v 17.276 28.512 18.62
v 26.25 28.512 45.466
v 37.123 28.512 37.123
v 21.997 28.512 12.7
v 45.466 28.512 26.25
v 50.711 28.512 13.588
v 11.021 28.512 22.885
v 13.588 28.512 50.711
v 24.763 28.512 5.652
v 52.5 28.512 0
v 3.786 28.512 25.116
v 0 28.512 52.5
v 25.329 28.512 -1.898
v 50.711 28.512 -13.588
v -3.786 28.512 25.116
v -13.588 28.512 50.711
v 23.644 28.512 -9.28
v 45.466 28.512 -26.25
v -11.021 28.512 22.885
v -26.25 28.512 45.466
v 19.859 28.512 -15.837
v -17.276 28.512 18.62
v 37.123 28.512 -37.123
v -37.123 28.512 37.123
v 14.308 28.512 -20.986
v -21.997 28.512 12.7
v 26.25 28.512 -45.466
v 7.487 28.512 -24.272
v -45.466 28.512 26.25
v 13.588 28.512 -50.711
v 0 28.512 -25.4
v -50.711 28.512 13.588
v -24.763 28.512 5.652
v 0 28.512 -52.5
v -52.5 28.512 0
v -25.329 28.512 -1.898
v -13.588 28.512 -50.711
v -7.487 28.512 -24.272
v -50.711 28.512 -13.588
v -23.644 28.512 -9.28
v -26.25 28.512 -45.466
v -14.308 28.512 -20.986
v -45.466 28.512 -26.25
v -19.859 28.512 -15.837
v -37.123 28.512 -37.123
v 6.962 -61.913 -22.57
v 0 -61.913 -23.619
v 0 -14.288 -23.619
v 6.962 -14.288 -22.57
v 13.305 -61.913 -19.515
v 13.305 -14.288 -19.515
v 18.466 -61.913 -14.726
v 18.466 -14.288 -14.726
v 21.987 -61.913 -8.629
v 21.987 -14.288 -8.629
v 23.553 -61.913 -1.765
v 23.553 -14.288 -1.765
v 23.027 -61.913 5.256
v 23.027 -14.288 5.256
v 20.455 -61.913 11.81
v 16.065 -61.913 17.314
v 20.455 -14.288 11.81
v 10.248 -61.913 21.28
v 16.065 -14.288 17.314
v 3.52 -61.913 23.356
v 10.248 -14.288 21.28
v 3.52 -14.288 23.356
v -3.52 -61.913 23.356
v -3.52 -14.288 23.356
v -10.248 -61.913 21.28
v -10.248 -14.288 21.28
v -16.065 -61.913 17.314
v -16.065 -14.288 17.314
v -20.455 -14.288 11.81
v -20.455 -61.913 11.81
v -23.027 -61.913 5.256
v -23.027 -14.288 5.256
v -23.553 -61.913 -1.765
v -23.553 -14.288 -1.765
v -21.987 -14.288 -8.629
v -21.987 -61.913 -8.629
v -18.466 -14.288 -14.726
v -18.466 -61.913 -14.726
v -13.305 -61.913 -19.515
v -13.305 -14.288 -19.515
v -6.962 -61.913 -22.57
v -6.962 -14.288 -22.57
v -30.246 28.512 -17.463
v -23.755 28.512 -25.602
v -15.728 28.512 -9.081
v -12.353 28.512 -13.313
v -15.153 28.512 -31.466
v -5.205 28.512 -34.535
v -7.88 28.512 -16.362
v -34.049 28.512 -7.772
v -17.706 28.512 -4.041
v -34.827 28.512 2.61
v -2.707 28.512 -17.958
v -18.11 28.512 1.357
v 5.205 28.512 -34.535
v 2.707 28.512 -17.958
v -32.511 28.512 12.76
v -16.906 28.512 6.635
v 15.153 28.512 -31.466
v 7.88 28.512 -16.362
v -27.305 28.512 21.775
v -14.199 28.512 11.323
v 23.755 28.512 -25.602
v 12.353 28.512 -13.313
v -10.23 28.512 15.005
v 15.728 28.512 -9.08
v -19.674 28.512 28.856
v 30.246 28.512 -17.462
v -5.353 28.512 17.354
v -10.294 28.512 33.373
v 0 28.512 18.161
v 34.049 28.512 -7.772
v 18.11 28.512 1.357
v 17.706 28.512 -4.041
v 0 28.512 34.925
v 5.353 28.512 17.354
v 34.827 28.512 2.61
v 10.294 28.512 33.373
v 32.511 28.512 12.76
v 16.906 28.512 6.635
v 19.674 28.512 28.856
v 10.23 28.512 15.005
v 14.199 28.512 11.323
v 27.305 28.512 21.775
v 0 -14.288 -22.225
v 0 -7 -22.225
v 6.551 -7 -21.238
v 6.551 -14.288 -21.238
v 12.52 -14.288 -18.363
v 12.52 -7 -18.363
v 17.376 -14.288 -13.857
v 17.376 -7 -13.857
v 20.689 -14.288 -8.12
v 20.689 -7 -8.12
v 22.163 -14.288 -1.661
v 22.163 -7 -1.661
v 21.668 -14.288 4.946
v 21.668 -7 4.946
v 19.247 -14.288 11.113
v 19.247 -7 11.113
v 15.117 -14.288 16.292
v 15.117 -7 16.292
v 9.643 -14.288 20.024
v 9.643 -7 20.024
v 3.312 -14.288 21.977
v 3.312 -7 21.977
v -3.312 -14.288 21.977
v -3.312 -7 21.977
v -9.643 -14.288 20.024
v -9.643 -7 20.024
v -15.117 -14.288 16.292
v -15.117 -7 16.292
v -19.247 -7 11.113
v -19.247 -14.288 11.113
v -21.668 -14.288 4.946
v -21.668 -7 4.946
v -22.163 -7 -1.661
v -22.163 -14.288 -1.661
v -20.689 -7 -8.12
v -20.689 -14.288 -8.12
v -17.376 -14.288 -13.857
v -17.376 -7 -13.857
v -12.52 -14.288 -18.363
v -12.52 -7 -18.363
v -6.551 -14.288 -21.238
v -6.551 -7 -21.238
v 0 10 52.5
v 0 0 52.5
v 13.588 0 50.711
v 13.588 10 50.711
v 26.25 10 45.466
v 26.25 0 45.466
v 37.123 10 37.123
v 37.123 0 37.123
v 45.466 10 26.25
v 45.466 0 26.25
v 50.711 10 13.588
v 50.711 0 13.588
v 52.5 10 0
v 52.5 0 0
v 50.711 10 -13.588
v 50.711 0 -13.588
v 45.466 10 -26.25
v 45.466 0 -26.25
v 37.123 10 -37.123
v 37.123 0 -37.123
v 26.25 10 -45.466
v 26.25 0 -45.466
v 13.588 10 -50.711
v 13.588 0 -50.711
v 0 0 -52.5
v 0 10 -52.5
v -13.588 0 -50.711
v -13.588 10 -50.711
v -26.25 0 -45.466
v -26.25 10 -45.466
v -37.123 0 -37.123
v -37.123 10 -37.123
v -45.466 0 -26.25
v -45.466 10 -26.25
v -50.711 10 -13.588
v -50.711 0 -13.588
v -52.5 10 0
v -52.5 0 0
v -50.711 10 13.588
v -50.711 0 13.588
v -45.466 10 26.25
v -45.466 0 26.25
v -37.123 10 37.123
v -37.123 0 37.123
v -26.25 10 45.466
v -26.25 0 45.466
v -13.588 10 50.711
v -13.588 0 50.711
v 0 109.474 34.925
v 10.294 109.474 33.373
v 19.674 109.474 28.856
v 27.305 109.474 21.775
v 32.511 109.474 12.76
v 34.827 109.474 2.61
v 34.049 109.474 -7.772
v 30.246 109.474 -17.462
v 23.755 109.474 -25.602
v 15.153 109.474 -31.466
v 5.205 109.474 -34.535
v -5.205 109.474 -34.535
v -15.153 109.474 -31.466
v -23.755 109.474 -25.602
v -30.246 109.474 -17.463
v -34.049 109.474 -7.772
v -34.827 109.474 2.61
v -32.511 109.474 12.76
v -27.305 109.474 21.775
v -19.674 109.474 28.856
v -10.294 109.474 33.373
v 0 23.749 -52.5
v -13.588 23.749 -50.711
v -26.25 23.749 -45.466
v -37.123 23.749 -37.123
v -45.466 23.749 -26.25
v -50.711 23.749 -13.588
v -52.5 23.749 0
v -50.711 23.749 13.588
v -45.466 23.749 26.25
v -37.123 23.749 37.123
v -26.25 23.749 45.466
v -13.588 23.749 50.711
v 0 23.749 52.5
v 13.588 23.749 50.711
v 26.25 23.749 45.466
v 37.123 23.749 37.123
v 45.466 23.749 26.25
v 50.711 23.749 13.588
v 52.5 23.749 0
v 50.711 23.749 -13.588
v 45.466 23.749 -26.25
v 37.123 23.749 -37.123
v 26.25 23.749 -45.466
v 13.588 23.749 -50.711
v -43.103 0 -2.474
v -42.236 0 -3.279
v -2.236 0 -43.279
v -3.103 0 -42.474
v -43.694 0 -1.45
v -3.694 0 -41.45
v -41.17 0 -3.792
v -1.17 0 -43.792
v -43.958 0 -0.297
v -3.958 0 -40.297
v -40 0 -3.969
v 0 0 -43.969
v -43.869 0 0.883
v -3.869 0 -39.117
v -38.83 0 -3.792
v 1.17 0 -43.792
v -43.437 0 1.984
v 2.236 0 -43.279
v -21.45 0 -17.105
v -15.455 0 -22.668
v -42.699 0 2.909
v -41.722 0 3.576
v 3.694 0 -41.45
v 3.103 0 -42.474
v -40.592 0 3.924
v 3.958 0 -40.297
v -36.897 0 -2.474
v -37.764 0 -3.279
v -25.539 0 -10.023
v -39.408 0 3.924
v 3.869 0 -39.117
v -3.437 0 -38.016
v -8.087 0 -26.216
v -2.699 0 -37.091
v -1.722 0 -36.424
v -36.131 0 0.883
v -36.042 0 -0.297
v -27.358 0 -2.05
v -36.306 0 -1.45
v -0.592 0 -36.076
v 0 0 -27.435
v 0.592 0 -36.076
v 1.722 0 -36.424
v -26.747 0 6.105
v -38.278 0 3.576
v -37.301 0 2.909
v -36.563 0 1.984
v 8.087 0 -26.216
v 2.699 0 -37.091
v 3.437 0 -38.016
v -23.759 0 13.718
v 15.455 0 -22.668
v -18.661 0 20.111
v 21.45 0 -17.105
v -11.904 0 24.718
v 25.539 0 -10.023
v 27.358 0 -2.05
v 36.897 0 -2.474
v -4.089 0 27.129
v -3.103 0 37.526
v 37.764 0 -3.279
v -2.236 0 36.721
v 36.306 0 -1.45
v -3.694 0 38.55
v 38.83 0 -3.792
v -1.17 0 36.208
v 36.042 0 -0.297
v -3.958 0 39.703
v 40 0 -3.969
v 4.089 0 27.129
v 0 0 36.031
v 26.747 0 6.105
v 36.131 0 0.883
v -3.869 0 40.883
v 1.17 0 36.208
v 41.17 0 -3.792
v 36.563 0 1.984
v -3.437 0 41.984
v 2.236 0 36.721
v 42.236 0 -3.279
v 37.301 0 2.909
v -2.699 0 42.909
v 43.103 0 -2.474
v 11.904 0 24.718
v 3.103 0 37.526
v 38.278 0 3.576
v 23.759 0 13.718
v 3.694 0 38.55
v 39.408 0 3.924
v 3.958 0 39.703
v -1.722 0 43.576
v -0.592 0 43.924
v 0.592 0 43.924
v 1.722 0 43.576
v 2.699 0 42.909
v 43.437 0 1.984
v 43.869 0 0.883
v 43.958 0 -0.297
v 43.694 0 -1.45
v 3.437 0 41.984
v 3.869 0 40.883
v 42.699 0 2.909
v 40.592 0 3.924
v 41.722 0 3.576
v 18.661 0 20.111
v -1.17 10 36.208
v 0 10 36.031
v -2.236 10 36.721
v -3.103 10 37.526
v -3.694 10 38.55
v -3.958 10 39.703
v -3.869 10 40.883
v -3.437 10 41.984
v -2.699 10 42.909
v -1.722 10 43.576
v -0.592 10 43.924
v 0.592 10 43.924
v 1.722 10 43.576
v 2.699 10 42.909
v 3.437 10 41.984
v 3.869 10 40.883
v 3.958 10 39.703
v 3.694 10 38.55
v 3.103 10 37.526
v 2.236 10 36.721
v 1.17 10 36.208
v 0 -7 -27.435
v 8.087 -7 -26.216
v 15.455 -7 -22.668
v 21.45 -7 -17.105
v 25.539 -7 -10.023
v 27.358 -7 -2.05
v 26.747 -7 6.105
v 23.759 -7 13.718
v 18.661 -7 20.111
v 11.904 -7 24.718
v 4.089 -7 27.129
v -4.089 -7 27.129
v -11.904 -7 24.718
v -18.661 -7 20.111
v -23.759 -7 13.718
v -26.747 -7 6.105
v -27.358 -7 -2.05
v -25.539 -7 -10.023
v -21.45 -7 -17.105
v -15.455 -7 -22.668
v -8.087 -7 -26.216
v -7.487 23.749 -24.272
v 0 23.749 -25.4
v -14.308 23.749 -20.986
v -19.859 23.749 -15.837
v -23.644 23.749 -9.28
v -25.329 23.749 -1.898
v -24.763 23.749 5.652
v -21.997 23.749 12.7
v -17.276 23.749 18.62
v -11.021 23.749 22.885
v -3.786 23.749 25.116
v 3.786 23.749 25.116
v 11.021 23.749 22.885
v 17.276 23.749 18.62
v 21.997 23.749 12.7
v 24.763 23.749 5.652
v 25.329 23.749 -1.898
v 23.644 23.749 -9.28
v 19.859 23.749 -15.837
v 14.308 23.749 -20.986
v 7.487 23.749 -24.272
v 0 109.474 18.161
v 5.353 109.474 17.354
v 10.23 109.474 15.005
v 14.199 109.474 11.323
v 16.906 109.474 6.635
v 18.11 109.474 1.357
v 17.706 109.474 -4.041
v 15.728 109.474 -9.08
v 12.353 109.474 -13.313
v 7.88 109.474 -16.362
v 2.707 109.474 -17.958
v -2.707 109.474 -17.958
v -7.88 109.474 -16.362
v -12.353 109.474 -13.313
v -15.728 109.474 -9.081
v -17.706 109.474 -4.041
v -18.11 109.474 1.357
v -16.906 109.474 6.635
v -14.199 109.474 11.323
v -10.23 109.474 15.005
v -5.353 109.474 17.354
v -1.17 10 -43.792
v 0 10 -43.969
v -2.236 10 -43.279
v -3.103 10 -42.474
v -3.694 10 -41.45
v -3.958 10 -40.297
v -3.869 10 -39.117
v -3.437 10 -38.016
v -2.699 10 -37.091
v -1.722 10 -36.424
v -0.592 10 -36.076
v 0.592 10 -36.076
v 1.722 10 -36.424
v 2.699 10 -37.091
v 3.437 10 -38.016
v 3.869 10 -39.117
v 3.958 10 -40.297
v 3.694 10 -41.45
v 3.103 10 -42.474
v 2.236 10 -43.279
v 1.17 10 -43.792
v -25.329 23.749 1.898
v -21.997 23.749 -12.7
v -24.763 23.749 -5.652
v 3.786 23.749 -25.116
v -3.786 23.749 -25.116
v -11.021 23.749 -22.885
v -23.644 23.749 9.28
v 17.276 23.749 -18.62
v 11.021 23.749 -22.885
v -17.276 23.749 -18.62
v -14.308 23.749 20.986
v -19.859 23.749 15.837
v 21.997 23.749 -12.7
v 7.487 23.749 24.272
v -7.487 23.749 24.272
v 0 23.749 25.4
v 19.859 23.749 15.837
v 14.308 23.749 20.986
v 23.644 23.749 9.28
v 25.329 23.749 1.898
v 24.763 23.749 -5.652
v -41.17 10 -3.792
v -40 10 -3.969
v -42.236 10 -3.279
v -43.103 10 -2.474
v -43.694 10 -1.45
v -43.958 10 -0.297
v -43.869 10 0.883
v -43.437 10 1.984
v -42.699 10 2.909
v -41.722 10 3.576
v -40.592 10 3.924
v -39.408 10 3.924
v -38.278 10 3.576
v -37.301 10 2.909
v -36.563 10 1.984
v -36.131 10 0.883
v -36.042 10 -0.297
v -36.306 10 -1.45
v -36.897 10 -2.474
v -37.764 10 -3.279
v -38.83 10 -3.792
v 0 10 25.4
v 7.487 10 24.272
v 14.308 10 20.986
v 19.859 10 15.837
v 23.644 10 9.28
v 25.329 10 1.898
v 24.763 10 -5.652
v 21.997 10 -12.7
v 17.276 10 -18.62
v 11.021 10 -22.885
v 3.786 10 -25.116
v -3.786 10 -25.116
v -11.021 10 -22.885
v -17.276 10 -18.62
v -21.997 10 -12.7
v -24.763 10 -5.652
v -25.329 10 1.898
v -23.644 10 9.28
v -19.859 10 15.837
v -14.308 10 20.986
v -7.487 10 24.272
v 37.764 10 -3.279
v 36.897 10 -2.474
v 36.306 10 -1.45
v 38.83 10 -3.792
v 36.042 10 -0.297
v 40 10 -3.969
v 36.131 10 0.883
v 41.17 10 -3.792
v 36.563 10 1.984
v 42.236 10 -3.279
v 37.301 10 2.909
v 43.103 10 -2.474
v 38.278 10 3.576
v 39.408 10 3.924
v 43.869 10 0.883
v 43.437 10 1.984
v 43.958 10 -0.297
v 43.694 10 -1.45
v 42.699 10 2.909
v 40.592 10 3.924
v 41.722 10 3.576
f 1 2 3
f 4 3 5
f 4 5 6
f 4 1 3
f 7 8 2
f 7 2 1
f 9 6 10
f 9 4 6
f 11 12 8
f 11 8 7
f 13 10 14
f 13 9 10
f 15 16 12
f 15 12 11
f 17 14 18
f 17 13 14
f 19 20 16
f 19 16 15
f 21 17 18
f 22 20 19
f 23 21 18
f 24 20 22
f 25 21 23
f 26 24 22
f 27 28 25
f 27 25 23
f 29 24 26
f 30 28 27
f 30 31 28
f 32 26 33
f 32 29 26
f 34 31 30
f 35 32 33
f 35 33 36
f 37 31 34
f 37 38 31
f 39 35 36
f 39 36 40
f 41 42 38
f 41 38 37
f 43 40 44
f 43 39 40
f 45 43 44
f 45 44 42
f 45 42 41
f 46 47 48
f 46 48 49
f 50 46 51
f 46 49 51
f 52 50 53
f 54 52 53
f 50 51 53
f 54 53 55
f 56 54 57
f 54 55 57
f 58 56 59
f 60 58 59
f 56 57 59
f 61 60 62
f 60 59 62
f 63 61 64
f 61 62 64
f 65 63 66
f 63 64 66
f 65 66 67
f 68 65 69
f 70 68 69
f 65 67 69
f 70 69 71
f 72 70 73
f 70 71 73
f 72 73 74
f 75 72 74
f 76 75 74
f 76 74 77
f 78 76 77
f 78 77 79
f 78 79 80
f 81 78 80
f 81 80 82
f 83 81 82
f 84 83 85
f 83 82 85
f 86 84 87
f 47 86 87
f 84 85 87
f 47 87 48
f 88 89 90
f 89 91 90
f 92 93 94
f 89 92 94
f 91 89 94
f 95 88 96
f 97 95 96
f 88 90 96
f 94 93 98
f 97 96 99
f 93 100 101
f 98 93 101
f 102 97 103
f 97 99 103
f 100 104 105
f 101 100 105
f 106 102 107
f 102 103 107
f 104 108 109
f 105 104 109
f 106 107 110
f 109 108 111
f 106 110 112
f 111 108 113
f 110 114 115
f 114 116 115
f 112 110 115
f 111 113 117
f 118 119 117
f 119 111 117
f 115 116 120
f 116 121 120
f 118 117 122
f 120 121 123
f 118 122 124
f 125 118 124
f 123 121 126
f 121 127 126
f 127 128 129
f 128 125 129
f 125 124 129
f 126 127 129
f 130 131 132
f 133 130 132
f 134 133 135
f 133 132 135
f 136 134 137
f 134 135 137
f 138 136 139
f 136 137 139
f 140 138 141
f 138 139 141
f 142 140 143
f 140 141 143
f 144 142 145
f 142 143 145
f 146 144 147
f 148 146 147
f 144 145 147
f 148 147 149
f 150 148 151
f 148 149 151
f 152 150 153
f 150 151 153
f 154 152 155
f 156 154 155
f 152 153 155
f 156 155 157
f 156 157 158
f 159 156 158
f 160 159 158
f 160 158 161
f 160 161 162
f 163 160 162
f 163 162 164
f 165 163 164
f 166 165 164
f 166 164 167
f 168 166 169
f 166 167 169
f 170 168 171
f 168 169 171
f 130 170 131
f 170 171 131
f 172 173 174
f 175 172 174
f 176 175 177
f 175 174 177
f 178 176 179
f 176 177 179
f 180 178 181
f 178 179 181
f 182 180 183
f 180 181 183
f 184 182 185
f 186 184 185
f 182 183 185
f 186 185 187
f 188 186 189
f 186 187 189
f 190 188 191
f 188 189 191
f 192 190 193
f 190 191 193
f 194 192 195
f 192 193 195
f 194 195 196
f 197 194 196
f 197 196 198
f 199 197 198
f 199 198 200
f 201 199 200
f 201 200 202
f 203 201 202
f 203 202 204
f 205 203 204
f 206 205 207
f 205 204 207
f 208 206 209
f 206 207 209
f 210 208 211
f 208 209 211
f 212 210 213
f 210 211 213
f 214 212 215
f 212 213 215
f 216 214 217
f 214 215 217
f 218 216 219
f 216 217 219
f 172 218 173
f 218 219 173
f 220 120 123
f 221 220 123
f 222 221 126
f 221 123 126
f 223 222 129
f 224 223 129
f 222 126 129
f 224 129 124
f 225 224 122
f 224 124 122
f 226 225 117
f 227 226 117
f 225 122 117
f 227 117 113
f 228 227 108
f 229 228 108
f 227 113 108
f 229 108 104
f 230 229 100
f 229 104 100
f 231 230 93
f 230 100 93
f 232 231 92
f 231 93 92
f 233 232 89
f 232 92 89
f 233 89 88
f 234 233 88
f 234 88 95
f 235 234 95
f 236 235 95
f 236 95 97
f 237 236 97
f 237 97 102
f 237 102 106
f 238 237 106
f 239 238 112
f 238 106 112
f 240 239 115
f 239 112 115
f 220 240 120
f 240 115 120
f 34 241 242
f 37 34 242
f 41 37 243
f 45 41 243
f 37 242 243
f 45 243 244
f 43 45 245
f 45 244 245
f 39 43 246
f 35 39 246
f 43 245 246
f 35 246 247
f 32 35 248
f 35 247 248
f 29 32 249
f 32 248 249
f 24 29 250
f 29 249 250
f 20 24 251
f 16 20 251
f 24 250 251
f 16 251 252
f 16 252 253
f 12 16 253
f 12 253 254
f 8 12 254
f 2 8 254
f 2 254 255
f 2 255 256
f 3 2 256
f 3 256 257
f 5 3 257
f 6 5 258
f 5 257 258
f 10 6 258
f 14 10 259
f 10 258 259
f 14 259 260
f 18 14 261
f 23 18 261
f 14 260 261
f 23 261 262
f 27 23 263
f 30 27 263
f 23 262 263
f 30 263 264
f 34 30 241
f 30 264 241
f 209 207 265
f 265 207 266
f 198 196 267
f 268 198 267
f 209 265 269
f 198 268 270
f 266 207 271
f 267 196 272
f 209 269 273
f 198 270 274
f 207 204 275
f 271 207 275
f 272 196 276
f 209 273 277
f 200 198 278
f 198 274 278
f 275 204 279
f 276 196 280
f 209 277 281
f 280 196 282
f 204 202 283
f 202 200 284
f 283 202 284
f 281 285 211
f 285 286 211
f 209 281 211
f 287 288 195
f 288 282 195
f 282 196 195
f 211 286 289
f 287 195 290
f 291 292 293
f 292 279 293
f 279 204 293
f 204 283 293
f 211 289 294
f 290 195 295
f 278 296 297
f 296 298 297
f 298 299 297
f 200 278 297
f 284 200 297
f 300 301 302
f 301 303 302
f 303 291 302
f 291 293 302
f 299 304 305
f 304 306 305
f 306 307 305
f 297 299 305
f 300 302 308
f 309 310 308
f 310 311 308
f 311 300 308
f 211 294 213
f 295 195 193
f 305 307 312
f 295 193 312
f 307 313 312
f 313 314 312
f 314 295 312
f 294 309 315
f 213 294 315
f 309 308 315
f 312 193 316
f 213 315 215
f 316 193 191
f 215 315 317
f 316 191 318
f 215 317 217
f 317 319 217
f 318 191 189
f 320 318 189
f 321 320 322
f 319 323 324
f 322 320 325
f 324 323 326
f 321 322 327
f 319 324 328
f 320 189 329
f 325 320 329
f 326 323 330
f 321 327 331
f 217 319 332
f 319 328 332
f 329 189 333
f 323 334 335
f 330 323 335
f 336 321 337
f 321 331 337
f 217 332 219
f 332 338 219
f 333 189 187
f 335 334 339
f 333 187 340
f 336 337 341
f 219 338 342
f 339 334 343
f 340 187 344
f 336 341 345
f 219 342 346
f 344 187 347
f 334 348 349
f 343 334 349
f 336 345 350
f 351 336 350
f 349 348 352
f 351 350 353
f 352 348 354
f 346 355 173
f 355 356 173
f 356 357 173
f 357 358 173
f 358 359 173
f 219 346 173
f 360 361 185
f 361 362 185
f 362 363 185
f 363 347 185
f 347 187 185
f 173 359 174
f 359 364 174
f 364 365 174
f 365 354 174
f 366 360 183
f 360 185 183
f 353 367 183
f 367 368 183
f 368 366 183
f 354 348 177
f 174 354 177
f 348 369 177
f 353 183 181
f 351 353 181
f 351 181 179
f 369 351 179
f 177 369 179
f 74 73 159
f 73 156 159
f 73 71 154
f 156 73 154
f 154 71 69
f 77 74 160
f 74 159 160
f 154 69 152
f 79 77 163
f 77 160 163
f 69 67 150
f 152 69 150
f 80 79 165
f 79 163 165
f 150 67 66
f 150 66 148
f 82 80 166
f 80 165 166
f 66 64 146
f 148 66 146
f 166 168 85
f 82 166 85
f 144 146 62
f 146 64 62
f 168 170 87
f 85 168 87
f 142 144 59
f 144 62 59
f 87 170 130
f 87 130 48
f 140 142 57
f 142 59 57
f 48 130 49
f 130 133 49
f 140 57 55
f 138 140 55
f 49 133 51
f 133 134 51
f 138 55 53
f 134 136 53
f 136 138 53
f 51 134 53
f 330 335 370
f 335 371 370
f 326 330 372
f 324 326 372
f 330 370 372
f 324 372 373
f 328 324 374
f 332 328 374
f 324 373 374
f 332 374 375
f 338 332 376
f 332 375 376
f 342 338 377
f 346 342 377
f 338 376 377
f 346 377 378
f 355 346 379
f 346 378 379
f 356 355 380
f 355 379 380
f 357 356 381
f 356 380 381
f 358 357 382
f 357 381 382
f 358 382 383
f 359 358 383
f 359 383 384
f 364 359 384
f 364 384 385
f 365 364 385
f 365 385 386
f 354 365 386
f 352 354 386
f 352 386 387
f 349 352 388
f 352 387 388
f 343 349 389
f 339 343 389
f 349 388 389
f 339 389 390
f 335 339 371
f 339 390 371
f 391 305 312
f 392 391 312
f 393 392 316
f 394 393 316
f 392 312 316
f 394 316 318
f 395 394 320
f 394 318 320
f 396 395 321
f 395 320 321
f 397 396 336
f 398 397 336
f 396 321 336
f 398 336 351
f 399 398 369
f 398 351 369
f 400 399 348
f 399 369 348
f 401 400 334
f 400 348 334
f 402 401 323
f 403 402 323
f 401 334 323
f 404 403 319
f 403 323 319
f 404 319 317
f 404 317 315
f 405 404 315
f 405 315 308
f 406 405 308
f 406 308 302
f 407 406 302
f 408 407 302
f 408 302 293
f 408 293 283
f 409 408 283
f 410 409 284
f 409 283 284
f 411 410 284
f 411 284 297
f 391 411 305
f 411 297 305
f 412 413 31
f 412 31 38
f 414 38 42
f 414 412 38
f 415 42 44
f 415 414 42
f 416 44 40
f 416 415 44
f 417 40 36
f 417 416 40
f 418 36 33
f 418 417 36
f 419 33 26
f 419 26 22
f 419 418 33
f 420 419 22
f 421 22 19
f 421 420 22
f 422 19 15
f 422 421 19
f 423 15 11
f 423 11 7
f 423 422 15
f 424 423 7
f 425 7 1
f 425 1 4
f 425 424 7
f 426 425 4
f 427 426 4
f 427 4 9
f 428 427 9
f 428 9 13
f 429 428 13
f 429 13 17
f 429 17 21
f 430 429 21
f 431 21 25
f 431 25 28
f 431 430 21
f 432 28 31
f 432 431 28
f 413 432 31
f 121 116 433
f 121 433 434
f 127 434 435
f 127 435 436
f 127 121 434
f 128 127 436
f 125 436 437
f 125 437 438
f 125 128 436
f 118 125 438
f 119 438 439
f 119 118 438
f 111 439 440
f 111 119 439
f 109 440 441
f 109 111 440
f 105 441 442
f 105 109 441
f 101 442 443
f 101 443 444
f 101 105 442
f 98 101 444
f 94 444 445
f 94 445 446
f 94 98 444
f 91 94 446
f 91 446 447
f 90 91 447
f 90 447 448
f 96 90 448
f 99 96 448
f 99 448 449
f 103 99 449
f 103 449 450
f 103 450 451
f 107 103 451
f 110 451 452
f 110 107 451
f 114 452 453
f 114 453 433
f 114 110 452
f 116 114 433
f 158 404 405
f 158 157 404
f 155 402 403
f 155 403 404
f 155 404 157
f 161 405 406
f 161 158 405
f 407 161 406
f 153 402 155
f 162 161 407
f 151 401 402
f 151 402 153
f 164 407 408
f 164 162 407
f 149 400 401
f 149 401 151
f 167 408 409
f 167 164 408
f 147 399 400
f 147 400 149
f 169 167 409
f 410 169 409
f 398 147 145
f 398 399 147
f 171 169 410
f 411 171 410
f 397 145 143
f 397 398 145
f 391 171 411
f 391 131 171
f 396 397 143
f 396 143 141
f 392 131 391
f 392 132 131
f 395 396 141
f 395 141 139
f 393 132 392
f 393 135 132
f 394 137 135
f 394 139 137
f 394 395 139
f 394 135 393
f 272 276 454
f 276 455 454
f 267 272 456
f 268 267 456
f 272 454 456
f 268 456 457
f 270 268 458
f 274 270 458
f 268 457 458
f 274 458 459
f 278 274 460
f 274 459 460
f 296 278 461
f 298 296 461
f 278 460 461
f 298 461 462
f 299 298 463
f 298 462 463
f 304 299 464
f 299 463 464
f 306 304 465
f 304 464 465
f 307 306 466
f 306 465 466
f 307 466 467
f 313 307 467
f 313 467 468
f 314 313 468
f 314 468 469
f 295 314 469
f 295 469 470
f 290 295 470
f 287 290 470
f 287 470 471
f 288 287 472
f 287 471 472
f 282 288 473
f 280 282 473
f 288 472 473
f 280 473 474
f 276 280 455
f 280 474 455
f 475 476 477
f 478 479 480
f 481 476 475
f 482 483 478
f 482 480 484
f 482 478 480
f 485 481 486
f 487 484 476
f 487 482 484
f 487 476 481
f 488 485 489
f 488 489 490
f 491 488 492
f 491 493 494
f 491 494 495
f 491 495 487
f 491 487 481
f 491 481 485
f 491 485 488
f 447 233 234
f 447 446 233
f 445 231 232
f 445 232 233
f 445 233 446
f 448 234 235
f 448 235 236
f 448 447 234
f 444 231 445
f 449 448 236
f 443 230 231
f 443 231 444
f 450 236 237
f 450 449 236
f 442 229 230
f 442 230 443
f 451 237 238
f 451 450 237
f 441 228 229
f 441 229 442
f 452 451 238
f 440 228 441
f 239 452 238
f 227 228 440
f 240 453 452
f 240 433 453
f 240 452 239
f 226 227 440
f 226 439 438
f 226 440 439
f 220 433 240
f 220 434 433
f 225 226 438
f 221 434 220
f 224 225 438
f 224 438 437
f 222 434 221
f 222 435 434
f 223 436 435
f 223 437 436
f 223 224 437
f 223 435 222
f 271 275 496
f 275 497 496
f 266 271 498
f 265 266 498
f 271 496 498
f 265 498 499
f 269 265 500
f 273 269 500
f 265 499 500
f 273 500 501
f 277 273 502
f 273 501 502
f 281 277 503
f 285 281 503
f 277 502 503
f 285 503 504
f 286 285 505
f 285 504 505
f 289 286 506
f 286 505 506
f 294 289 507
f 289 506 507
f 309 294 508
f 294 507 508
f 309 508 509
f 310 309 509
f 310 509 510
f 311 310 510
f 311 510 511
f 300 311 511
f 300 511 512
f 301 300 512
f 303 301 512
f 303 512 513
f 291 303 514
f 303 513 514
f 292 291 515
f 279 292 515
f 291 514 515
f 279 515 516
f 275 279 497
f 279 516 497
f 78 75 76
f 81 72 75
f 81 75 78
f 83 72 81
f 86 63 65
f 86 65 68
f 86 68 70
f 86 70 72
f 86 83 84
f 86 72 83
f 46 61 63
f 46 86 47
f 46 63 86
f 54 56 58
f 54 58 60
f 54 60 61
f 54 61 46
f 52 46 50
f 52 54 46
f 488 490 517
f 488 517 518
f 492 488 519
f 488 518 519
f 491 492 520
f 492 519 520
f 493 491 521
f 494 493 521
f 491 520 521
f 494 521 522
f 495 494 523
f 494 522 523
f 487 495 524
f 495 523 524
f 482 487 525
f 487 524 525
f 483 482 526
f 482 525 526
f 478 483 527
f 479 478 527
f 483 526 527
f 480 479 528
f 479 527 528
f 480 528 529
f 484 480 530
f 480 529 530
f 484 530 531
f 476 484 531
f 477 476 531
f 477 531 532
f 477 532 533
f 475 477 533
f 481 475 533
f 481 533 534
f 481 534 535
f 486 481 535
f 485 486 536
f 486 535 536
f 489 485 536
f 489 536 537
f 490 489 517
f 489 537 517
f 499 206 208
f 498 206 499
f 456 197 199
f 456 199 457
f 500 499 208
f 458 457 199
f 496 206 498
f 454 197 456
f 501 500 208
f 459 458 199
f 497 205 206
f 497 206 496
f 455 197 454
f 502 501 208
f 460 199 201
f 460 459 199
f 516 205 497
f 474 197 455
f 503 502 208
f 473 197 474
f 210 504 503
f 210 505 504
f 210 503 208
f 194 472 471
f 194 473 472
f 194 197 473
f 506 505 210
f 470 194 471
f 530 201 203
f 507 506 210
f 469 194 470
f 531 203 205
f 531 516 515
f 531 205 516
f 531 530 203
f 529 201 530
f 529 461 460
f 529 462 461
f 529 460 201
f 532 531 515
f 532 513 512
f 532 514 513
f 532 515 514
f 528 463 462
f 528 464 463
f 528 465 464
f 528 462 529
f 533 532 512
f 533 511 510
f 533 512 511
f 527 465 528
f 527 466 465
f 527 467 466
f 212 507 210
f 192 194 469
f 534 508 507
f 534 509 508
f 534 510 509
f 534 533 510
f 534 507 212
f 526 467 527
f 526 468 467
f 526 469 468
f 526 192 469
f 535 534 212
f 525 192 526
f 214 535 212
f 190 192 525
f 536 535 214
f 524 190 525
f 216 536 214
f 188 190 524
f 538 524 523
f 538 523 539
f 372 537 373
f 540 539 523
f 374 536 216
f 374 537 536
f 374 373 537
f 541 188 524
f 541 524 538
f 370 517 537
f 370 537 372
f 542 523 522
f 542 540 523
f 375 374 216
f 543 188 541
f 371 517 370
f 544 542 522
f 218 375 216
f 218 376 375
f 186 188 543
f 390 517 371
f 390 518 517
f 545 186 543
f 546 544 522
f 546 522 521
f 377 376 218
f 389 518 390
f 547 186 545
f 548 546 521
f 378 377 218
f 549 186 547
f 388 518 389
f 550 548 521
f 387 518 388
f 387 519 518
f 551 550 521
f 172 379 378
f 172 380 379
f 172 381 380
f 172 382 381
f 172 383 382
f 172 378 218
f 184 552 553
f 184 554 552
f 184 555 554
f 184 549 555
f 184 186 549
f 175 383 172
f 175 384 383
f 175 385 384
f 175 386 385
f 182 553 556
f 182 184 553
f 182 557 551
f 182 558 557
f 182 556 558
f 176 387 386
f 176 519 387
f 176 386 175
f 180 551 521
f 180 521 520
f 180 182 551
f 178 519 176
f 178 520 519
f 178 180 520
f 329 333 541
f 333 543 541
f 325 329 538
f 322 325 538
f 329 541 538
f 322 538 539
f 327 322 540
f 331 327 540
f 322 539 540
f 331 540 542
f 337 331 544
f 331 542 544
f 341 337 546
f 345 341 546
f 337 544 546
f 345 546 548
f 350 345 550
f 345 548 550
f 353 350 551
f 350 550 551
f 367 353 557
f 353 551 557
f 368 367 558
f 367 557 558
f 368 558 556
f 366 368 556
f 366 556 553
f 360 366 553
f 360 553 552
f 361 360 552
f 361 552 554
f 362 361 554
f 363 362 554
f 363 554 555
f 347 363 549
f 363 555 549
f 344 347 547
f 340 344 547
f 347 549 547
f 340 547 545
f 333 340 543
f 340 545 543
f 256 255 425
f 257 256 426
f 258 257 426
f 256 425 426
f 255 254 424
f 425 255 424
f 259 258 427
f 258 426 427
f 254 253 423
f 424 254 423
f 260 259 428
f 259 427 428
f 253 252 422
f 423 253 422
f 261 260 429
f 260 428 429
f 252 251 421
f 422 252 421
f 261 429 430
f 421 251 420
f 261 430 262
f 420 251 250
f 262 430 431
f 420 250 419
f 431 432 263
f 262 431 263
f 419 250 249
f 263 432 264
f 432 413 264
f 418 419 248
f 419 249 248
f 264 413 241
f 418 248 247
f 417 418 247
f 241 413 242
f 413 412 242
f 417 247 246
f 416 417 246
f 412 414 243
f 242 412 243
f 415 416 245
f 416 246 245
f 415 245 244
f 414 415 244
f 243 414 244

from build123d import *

# Parameters (mm, degrees)
MOUNTING_PLATE_SKETCH_R = 52.500000029
MOUNT_PLATE_DEPTH       = 10
HUB_RIM_SEAT_SKETCH_R   = 27.435
HUB_SEAT_DEPTH          = 7
SKETCH4_R               = 22.225
CENTERLOCK_SHAFT_DEPTH  = 7.287514
SKETCH7_R               = 25.4
BOSS_EXTRUDE5_DEPTH     = 13.74902
SKETCH6_R               = 52.500000029
SKETCH6_R_2             = 25.4
BOSS_EXTRUDE7_DEPTH     = 4.7625
SKETCH11_W              = 3.96875
SKETCH11_H              = 10
DRIVE_PINS_AT_2_COUNT   = 2
DRIVE_PINS_AT_2_PITCH   = 56.568542495
DRIVE_PINS_AT_3_COUNT   = 2
DRIVE_PINS_AT_3_PITCH   = 80
DRIVE_PINS_AT_4_COUNT   = 2
DRIVE_PINS_AT_4_PITCH   = 56.568542495
SKETCH12_R              = 34.925
SKETCH12_R_2            = 18.161
BOSS_EXTRUDE8_DEPTH     = 80.9625
SKETCH22_R              = 23.61946
BOSS_EXTRUDE9_DEPTH     = 47.625


with BuildPart() as part:
    # Mounting Plate SKETCH → Mount Plate (new body)
    with BuildSketch(Plane(origin=(0, 0, 0), x_dir=(1, 0, 0), z_dir=(0, 1, 0))):
        Circle(MOUNTING_PLATE_SKETCH_R)
    extrude(amount=MOUNT_PLATE_DEPTH)

    # Hub-Rim Seat SKETCH → Hub Seat (add)
    with BuildSketch(Plane.XZ):
        Circle(HUB_RIM_SEAT_SKETCH_R)
    extrude(amount=HUB_SEAT_DEPTH)

    # Sketch4 → Centerlock Shaft (add)
    with BuildSketch(Plane.XZ.offset(7)):
        Circle(SKETCH4_R)
    extrude(amount=CENTERLOCK_SHAFT_DEPTH)

    # Sketch7 → Boss-Extrude5 (add)
    with BuildSketch(Plane(origin=(0, 10, 0), x_dir=(1, 0, 0), z_dir=(0, 1, 0))):
        Circle(SKETCH7_R)
    extrude(amount=BOSS_EXTRUDE5_DEPTH)

    # Sketch11 → Drive Pins (revolve, cut)
    with BuildSketch(Plane(origin=(0, 0, 40), x_dir=(0, 0, -1), z_dir=(1, 0, 0))):
        with Locations((1.984375, 5)):
            Rectangle(SKETCH11_W, SKETCH11_H)
    drive_pins = revolve(axis=Axis((0, -6.35, 40), (0, 1, 0)), mode=Mode.SUBTRACT)

    # Drive Pins at 2: Drive Pins ×2
    with Locations(*[Vector(-0.7071067811865475, 0, -0.7071067811865477) * (i * DRIVE_PINS_AT_2_PITCH) for i in range(1, DRIVE_PINS_AT_2_COUNT)]):
        add(drive_pins, mode=Mode.SUBTRACT)

    # Drive Pins at 3: Drive Pins ×2
    with Locations(*[(0, 0, -i * DRIVE_PINS_AT_3_PITCH) for i in range(1, DRIVE_PINS_AT_3_COUNT)]):
        add(drive_pins, mode=Mode.SUBTRACT)

    # Drive Pins at 4: Drive Pins ×2
    with Locations(*[Vector(0.7071067811865476, 0, -0.7071067811865475) * (i * DRIVE_PINS_AT_4_PITCH) for i in range(1, DRIVE_PINS_AT_4_COUNT)]):
        add(drive_pins, mode=Mode.SUBTRACT)

    # Sketch22 → Boss-Extrude9 (add)
    with BuildSketch(Plane.XZ.offset(14.287514)):
        Circle(SKETCH22_R)
    extrude(amount=BOSS_EXTRUDE9_DEPTH)


with BuildPart() as body_2:
    # Sketch6 → Boss-Extrude7 (new body)
    with BuildSketch(Plane(origin=(0, 23.74902, 0), x_dir=(1, 0, 0), z_dir=(0, 1, 0))):
        Circle(SKETCH6_R)
        Circle(SKETCH6_R_2, mode=Mode.SUBTRACT)
    extrude(amount=BOSS_EXTRUDE7_DEPTH)


with BuildPart() as body_3:
    # Sketch12 → Boss-Extrude8 (new body)
    with BuildSketch(Plane(origin=(0, 28.51152, 0), x_dir=(1, 0, 0), z_dir=(0, 1, 0))):
        Circle(SKETCH12_R)
        Circle(SKETCH12_R_2, mode=Mode.SUBTRACT)
    extrude(amount=BOSS_EXTRUDE8_DEPTH)


solid = Compound([part.part, body_2.part, body_3.part])
